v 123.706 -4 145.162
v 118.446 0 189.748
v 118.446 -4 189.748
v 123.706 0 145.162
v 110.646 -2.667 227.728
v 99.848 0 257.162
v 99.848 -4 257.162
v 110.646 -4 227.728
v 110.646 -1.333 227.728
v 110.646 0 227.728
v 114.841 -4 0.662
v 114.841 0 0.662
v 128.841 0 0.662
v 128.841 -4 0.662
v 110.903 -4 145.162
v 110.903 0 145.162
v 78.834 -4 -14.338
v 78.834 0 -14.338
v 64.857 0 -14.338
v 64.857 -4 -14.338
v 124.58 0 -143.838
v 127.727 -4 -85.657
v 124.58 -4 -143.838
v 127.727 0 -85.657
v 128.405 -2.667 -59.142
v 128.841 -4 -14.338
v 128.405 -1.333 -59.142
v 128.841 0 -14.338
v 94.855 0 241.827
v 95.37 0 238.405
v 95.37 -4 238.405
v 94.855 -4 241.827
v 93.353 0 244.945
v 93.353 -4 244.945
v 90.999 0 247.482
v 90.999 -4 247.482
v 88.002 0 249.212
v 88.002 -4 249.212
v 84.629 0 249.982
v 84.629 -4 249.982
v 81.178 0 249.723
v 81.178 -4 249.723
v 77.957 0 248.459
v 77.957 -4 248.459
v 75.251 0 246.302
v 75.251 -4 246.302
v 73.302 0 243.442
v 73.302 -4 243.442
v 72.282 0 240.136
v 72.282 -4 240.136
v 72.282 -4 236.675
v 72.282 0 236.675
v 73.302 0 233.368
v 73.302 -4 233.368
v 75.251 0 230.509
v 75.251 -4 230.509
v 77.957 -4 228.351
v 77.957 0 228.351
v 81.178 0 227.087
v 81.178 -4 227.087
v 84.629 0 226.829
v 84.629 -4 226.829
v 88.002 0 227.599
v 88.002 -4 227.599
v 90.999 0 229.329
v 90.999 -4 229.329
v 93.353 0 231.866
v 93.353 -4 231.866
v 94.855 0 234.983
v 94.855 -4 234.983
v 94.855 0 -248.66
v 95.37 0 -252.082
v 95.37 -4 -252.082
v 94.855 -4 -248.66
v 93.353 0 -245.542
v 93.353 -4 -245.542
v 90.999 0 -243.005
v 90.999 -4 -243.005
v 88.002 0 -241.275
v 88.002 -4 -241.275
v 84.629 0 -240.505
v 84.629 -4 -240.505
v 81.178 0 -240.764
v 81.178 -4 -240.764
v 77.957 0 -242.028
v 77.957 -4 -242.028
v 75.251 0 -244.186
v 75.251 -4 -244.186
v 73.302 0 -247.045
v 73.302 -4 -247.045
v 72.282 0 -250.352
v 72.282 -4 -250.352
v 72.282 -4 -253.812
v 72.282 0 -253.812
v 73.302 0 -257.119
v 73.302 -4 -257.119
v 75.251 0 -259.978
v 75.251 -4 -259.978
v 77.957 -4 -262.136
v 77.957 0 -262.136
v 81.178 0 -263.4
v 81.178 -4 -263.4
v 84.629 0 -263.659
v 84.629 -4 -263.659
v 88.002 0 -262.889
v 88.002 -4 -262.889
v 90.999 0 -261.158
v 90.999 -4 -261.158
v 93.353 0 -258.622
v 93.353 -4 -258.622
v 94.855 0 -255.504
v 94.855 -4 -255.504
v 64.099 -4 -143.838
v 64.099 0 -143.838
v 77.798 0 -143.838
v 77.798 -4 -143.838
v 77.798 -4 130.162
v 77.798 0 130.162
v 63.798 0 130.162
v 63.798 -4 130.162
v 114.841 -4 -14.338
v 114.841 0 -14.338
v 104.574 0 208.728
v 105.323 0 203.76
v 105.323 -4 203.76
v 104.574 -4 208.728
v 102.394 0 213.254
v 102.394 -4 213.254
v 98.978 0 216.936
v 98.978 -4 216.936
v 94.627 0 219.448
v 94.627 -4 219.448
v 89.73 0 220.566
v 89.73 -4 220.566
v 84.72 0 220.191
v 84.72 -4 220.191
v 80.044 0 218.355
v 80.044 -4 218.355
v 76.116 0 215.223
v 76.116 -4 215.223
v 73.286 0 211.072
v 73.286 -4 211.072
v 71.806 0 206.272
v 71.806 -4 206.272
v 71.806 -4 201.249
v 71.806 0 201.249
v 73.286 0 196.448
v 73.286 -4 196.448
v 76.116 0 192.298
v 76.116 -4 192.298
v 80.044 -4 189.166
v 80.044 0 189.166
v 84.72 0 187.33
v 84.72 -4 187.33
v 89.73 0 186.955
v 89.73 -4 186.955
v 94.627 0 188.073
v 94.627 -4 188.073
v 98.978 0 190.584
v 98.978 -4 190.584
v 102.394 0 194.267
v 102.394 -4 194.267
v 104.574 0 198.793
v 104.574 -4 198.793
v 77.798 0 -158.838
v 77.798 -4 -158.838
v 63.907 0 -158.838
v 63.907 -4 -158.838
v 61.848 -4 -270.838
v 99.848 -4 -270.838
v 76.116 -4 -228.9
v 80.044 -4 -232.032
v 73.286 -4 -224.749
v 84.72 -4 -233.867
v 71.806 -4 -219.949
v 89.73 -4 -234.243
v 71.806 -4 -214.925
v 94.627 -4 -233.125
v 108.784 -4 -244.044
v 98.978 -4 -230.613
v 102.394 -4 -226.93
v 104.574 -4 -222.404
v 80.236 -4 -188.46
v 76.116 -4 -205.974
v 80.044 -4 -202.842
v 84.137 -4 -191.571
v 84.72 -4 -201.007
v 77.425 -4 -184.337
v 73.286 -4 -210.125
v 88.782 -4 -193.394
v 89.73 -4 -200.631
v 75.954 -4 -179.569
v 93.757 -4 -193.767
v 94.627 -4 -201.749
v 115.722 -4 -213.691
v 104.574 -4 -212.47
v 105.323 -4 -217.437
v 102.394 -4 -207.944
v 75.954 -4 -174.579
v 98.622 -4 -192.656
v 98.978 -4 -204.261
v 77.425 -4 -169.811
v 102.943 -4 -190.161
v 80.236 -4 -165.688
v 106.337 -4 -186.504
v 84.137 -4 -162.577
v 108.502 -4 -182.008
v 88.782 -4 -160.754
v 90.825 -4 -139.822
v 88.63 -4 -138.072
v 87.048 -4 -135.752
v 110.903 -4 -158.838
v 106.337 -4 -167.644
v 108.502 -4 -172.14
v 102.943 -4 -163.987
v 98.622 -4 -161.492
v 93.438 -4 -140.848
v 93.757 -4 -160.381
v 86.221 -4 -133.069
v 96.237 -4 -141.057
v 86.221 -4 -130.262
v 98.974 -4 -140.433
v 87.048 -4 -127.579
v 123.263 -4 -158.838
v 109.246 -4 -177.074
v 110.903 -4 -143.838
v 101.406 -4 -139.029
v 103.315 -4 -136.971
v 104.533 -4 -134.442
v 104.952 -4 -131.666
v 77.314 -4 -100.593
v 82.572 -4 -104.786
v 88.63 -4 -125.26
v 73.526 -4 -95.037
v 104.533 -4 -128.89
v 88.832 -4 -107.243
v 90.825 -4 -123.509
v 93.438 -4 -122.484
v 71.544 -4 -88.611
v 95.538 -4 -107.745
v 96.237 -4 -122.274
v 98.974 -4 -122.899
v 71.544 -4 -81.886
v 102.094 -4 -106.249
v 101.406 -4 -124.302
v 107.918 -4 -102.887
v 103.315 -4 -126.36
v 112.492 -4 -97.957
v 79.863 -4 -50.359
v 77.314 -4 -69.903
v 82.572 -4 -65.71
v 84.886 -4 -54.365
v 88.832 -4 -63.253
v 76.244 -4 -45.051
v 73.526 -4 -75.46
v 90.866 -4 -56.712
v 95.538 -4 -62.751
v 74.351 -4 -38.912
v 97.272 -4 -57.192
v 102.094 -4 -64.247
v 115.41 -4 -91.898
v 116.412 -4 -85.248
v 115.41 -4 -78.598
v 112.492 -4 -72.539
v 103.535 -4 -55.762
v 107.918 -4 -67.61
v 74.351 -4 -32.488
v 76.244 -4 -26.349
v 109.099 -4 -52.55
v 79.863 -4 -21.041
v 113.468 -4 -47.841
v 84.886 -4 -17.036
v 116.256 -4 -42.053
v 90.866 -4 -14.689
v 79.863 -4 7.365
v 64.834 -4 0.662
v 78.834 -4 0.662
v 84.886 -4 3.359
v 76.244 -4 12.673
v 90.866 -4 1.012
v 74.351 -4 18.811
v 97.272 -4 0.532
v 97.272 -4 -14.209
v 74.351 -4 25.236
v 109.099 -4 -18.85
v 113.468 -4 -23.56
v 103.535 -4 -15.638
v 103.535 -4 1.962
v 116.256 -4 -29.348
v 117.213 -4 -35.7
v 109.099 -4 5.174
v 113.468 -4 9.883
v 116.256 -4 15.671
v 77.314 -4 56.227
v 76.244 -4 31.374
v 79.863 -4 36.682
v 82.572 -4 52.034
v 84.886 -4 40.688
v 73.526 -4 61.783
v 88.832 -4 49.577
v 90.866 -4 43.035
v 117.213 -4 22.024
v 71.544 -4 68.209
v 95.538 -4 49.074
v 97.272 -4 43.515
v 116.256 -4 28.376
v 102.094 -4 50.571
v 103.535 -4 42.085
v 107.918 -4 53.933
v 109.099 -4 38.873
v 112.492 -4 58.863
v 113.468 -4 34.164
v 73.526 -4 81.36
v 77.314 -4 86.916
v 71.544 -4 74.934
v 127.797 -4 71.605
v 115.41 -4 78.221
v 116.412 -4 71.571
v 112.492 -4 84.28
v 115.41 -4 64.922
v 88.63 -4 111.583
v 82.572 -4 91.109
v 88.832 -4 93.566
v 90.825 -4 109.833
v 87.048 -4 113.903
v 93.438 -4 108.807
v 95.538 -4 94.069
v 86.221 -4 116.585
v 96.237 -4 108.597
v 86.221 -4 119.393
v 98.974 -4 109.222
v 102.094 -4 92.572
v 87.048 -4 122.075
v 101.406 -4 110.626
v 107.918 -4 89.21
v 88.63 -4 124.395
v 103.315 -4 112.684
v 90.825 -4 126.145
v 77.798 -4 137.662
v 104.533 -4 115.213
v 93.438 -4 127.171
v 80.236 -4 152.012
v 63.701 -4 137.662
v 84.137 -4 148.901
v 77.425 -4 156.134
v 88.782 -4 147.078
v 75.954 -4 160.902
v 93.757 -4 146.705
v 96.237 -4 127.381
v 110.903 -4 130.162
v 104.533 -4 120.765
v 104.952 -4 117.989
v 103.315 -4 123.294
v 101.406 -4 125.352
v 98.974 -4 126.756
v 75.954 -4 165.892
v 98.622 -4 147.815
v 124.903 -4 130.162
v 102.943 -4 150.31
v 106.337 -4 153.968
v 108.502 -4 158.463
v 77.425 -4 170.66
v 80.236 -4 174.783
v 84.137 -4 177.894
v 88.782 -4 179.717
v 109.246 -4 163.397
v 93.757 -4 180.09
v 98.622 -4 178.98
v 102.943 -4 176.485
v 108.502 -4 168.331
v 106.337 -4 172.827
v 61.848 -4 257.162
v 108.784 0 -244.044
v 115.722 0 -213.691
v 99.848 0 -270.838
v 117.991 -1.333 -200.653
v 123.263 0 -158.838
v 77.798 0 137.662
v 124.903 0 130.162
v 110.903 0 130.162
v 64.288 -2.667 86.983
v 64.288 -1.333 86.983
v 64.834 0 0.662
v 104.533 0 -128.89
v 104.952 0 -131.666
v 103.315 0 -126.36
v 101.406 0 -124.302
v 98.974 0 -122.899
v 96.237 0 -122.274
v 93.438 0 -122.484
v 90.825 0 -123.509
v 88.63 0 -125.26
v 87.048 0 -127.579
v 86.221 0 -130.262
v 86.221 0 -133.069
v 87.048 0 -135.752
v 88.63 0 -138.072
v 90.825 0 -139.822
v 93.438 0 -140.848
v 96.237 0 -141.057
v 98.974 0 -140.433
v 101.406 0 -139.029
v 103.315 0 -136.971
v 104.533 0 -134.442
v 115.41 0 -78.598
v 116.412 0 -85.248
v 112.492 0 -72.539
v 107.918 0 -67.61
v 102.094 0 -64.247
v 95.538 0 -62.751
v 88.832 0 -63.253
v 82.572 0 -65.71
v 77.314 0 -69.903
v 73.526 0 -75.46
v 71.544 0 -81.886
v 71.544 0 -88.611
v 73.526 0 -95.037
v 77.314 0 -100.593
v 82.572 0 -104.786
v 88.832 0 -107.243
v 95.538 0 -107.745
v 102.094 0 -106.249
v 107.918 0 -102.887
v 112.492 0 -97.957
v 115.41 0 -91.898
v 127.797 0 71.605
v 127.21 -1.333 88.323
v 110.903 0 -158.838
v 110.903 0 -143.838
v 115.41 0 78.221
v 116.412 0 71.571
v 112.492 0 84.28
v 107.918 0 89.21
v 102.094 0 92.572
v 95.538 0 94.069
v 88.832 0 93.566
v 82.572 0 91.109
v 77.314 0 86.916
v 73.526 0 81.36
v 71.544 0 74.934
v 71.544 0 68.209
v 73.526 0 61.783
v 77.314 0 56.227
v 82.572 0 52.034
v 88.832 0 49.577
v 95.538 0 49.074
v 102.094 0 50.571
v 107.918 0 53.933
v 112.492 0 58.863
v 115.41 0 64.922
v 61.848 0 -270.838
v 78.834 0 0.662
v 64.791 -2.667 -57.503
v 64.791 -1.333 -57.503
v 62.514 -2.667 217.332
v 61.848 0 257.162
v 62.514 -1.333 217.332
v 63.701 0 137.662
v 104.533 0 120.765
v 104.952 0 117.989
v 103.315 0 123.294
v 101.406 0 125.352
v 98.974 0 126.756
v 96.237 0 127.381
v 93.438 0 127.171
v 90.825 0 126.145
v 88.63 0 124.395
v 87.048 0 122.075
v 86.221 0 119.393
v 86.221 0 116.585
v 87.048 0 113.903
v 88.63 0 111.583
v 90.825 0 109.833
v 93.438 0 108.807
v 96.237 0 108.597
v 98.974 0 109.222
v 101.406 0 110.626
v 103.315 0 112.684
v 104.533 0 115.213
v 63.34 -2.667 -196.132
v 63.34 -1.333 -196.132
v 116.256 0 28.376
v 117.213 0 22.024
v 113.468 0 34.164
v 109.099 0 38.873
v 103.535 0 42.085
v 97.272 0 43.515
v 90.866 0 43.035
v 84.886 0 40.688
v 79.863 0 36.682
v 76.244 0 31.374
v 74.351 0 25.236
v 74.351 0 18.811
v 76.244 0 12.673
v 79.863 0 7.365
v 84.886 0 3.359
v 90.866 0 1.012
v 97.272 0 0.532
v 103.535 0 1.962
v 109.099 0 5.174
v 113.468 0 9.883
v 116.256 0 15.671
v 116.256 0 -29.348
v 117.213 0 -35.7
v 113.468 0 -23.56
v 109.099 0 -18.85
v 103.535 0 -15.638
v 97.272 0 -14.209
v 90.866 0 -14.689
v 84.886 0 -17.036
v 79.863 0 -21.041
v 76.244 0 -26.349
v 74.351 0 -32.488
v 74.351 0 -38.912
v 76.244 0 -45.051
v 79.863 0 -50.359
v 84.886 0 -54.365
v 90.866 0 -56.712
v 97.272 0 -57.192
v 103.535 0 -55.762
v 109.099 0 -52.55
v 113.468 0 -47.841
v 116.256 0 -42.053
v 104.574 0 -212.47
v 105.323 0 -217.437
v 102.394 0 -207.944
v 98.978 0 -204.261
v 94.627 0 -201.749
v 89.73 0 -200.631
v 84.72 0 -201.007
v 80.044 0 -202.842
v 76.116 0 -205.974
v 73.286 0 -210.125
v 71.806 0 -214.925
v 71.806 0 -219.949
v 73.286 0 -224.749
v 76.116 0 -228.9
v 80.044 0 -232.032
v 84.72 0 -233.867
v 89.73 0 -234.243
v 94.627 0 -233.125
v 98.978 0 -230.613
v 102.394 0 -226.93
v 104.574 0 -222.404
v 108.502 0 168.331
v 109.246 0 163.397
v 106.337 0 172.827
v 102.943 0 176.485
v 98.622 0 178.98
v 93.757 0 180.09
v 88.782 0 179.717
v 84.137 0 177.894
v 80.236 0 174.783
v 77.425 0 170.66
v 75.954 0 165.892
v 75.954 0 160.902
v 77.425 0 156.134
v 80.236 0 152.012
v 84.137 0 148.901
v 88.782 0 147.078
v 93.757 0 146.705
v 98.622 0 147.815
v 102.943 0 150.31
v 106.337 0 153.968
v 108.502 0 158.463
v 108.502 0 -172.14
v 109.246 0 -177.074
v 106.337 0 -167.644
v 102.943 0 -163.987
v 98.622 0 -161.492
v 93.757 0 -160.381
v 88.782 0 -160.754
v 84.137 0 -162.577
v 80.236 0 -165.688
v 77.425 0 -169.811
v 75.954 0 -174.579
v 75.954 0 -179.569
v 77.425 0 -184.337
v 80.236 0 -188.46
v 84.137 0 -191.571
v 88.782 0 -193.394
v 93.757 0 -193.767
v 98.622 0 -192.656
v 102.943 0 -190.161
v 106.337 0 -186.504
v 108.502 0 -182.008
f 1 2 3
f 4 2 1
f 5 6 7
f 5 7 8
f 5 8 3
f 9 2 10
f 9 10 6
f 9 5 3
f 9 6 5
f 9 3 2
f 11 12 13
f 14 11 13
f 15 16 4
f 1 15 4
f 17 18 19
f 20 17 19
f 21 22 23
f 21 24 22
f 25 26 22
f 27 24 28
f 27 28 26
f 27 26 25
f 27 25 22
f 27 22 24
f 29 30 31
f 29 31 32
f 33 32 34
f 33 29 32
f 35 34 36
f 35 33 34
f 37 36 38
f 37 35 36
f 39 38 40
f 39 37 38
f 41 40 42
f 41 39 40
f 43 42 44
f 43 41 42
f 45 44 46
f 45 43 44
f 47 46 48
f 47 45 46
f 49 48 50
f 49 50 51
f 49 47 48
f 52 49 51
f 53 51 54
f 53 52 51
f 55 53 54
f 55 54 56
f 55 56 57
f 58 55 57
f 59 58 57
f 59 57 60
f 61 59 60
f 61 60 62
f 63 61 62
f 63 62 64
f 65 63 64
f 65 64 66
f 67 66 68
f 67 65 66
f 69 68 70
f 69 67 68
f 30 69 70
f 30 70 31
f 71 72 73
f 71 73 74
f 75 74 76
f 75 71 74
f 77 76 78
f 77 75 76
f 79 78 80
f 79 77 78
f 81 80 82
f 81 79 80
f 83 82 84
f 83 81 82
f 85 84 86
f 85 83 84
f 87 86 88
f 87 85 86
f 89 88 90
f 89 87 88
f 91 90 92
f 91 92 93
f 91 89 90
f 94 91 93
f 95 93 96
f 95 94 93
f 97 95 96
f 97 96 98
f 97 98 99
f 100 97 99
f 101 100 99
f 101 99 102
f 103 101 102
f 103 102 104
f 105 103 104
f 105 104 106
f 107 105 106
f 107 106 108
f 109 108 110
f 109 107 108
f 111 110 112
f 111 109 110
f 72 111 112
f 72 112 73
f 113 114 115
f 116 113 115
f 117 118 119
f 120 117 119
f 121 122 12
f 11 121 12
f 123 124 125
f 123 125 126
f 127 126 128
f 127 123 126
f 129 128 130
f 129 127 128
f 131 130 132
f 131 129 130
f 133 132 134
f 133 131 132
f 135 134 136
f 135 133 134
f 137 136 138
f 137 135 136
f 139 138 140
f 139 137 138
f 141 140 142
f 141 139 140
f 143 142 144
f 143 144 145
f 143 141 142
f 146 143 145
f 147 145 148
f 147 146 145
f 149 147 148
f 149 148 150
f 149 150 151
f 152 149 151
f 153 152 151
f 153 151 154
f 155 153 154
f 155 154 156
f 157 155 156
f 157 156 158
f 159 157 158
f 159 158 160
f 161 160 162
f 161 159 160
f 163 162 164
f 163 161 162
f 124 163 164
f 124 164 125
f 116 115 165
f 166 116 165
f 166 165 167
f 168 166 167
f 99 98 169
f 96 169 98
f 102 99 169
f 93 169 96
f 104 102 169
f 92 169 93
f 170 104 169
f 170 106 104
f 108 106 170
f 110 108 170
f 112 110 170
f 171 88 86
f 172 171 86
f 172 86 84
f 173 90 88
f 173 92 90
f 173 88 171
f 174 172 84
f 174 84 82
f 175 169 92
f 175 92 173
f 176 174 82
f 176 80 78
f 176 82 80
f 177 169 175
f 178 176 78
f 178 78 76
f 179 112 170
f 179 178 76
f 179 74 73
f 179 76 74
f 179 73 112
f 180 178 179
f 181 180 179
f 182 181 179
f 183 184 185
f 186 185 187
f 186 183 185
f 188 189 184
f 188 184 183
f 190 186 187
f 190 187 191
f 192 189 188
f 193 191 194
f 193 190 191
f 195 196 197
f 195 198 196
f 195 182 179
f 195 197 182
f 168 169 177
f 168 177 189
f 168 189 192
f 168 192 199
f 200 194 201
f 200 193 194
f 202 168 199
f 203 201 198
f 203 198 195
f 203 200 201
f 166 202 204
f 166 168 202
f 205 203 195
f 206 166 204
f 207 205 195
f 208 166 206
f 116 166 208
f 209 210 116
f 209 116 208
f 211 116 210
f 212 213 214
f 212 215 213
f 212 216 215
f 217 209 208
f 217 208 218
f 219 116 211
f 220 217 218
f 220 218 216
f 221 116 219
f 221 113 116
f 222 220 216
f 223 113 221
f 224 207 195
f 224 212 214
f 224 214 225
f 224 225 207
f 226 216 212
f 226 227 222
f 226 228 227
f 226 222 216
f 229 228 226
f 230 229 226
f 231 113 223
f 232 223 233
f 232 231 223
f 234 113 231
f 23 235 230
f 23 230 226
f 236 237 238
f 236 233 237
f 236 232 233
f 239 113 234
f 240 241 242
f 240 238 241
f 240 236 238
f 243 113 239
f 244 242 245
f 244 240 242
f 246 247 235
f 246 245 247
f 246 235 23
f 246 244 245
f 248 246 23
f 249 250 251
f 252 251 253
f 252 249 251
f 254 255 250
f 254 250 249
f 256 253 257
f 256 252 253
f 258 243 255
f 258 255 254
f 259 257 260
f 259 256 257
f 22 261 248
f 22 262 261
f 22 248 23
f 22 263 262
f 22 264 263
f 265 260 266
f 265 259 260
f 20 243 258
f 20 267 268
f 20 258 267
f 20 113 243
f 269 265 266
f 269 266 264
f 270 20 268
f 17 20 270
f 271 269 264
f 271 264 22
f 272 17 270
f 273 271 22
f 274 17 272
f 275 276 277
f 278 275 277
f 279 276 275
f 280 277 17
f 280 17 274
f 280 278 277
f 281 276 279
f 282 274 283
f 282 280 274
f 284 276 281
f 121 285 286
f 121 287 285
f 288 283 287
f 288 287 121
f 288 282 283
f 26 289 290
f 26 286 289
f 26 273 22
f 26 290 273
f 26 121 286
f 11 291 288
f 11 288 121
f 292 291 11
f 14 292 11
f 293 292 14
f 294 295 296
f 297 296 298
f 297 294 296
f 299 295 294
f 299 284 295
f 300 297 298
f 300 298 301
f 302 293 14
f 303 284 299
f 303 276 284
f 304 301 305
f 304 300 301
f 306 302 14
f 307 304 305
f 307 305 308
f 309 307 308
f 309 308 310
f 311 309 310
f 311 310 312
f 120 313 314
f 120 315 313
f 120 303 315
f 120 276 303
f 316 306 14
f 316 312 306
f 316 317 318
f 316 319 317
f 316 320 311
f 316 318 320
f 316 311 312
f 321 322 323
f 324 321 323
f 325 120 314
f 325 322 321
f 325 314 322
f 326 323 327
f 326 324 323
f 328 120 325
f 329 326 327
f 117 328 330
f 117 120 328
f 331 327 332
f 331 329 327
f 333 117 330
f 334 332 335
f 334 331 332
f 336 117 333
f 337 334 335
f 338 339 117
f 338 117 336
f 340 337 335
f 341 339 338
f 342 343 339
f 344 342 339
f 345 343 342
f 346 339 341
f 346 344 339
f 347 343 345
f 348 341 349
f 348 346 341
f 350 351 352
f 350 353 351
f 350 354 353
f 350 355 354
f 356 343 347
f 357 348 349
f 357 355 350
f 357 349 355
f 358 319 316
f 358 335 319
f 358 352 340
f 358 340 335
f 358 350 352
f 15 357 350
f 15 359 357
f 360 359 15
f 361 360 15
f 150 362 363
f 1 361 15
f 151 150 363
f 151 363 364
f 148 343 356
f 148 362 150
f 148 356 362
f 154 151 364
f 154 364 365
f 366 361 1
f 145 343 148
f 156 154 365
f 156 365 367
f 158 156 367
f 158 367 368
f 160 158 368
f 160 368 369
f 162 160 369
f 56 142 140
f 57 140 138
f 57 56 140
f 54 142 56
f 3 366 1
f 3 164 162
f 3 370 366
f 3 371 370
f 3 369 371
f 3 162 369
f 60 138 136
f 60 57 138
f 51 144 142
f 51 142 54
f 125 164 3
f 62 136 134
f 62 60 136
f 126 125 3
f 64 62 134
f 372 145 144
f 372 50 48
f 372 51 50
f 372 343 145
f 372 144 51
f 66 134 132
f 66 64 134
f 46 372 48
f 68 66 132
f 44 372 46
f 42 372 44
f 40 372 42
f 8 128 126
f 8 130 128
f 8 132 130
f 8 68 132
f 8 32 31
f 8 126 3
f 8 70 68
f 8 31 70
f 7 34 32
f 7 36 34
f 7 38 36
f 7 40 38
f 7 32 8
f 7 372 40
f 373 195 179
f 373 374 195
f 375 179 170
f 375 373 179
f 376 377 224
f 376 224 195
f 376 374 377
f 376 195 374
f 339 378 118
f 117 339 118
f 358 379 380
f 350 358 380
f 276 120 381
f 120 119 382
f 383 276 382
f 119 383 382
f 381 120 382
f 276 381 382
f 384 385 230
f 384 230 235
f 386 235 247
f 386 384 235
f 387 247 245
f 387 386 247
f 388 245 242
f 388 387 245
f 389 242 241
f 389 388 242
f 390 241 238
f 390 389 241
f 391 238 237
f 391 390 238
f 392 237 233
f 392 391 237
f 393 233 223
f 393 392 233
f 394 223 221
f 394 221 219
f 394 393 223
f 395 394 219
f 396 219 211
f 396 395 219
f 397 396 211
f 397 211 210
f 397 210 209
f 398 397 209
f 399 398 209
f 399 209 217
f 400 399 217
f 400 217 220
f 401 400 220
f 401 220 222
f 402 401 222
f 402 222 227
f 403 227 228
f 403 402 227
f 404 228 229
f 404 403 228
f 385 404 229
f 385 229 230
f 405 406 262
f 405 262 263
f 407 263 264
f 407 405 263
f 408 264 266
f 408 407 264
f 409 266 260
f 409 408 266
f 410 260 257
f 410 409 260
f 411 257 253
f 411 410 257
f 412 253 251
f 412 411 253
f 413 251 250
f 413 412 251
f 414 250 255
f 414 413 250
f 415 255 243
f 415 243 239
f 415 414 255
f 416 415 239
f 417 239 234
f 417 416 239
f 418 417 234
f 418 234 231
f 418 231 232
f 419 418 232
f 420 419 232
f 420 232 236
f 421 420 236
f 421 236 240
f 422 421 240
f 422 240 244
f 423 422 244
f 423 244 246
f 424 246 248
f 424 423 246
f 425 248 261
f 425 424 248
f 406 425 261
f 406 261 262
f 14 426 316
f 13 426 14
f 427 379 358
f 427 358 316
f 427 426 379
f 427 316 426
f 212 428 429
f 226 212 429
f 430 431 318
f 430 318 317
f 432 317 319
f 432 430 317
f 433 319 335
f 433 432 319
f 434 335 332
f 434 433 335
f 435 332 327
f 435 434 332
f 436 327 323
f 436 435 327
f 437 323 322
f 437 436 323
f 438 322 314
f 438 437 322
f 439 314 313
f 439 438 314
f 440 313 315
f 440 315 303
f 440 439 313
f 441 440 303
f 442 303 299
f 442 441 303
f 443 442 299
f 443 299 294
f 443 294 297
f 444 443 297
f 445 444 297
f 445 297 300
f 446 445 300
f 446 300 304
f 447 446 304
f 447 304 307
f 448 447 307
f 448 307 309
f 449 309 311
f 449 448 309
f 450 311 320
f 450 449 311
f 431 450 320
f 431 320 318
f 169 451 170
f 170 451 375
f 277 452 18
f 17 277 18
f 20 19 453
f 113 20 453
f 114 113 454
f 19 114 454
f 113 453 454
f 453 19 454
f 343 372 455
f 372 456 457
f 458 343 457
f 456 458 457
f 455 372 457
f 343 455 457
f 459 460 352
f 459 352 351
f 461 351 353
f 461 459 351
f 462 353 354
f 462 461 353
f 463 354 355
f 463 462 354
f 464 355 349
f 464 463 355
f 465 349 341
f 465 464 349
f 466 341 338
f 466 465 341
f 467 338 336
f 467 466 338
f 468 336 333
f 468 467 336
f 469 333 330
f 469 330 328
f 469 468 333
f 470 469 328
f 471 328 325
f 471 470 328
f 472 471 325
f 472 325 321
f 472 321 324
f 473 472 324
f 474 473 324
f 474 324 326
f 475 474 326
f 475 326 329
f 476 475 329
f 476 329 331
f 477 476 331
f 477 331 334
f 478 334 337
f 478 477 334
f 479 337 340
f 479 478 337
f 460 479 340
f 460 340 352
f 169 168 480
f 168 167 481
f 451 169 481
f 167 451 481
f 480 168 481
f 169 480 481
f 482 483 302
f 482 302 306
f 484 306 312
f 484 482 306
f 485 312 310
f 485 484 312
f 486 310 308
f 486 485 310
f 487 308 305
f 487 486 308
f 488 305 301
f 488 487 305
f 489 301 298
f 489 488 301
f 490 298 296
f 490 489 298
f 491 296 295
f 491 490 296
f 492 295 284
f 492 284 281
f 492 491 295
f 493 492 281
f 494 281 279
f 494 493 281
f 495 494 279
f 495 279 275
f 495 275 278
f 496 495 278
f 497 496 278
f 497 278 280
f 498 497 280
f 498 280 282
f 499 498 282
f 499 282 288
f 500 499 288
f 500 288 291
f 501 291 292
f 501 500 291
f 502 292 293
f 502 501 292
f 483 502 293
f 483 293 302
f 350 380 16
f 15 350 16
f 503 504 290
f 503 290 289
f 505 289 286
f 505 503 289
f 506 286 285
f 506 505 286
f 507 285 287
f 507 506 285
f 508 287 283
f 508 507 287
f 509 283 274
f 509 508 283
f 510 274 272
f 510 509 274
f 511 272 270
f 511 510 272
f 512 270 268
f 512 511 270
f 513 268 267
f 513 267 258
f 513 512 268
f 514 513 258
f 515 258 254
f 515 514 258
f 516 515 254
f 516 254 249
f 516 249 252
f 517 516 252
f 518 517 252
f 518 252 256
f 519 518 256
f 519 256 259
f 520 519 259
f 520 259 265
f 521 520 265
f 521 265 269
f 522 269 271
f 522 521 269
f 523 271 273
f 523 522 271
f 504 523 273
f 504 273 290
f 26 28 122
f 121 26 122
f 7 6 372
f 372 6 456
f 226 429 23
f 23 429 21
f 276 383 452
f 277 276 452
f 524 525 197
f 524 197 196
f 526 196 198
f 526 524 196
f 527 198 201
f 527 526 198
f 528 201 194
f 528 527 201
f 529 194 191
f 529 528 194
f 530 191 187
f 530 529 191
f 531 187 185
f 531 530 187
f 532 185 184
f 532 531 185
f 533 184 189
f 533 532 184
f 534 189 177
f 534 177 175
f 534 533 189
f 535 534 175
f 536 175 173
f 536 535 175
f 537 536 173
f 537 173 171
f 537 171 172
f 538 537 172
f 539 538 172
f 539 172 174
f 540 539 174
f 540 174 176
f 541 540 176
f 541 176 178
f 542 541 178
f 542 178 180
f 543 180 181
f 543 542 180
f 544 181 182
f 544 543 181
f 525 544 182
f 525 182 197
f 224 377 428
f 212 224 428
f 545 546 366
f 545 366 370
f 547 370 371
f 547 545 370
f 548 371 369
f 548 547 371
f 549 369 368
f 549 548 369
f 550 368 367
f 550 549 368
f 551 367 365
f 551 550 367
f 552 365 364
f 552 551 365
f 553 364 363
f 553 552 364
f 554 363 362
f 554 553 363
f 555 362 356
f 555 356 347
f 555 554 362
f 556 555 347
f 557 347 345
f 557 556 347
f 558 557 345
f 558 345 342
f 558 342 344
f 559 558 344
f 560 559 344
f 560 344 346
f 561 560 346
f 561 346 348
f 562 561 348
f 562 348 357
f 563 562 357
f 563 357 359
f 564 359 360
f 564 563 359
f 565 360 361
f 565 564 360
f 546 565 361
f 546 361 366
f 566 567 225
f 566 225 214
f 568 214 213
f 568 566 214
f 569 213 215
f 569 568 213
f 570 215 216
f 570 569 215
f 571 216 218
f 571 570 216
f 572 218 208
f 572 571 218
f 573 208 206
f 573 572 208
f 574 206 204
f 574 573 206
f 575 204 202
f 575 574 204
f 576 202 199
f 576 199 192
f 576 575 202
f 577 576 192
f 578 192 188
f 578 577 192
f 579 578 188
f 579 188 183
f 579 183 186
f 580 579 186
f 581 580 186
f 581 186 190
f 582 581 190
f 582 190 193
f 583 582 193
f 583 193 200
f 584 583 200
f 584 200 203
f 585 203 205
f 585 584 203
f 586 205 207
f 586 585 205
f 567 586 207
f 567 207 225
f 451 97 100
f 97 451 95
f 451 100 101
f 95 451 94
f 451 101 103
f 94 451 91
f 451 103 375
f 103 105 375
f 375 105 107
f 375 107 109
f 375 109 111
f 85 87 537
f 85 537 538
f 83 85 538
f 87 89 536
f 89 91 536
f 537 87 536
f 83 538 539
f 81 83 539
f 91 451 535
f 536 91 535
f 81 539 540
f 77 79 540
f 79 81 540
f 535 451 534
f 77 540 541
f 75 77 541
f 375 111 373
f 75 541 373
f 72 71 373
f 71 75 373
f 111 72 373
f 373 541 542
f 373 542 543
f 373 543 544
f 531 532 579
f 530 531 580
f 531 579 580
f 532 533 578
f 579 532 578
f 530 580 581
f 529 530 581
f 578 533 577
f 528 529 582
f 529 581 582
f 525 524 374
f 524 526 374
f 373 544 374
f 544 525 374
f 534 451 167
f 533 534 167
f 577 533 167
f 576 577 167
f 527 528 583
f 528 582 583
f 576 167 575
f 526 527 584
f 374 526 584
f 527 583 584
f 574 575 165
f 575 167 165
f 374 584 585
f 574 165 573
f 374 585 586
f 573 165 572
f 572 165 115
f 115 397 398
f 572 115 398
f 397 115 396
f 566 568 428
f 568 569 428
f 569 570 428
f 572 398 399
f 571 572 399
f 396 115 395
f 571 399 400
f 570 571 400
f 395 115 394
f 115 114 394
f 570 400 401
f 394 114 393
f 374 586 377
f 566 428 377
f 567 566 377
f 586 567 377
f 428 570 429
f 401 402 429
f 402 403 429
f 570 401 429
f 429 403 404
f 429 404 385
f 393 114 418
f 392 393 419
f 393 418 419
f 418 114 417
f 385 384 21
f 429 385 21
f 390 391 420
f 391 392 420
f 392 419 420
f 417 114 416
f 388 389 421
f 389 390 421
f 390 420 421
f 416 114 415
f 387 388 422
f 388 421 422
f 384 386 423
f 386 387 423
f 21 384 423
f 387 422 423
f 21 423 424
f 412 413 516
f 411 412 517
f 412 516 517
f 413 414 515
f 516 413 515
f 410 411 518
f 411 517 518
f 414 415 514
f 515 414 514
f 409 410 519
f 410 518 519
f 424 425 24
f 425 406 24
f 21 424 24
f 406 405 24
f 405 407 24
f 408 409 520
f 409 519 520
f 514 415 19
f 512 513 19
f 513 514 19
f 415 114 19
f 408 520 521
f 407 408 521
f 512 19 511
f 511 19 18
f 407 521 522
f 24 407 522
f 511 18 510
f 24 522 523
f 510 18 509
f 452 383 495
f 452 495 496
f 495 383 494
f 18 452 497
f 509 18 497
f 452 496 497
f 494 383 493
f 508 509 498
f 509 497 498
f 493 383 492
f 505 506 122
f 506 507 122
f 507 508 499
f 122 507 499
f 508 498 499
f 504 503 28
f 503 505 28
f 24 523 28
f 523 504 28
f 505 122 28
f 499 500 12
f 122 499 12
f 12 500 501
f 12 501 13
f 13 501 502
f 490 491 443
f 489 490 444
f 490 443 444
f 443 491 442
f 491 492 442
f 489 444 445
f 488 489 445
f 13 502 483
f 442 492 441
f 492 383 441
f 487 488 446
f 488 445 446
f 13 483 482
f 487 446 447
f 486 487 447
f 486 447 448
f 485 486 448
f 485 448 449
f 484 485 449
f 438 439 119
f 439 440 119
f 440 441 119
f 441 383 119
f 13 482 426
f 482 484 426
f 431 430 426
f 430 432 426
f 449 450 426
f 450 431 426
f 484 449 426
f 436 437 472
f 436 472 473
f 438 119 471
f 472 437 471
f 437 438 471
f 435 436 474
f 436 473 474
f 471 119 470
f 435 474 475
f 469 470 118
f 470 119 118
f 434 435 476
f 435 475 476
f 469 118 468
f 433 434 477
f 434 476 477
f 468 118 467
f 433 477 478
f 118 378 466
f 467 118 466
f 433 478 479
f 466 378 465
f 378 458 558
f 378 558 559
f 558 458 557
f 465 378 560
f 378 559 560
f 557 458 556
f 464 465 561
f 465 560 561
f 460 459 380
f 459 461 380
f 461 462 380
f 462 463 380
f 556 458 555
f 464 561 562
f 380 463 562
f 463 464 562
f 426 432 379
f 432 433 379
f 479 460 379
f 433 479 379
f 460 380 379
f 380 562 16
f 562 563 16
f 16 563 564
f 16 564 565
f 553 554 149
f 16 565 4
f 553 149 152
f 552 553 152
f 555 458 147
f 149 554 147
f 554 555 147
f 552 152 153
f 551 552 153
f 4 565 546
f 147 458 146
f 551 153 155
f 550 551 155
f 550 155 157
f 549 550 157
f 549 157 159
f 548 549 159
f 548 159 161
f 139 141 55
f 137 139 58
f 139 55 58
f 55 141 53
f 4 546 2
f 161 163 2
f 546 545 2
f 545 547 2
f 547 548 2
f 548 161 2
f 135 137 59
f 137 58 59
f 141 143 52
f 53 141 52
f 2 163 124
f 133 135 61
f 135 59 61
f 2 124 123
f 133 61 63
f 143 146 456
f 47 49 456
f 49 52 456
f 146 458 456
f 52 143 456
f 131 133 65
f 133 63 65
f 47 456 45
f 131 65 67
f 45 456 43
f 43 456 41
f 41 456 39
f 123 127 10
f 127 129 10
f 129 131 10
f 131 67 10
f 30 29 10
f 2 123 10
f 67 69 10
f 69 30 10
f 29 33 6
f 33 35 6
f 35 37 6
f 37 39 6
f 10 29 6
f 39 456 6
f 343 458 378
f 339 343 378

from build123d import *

# Parameters (mm, degrees)
F0_R     = 22.5603447523
F0_R_2   = 21.5516802716
F0_R_3   = 9.418040514
F0_R_4   = 16.7395174503
F0_R_5   = 11.6092445083
F0_R_6   = 16.8526987349
F1_DEPTH = 4


# Not quite as in the source:
# - ends of sketch curves that miss each other by under 0.0002 mm in the source are joined


with BuildPart() as f1:
    # F0 (on Front) → F1 (new body)
    with BuildSketch(Plane.XZ):
        with BuildLine():
            Line((78.8341670899, -6.8383235484), (114.8409428481, -6.8383235484))
            Line((114.8409428481, -6.8383235484), (114.8409428481, 0.6616764516))
            Line((114.8409428481, 0.6616764516), (128.8409428481, 0.6616764516))
            add(Edge.make_bspline(
                [(124.9033857451, 130.1616764516), (127.8407562373, 89.5517987134), (128.7514642032, 44.6895821219), (128.8409428481, 0.6616764516)],
                knots=[0.2778483476, 0.2778483476, 0.2778483476, 0.2778483476, 0.4880499366, 0.4880499366, 0.4880499366, 0.4880499366], degree=3))
            Line((124.9033857451, 130.1616764516), (110.9033857451, 130.1616764516))
            Line((110.9033857451, 130.1616764516), (110.9033857451, 137.6616764516))
            Line((110.9033857451, 137.6616764516), (77.7980855424, 137.6616764516))
            Line((77.7980855424, 137.6616764516), (77.7980855424, 130.1616764516))
            Line((77.7980855424, 130.1616764516), (63.7980855424, 130.1616764516))
            add(Edge.make_bspline(
                [(63.7980855424, 130.1616764516), (64.3462926476, 86.9798084925), (64.7350115683, 43.8051528282), (64.8341670899, 0.6616764516)],
                knots=[0.2404841481, 0.2404841481, 0.2404841481, 0.2404841481, 0.4857851385, 0.4857851385, 0.4857851385, 0.4857851385], degree=3))
            Line((64.8341670899, 0.6616764516), (78.8341670899, 0.6616764516))
            Line((78.8341670899, 0.6616764516), (78.8341670899, -6.8383235484))
        make_face()
        with Locations((93.8518792391, 71.5714693069)):
            Circle(F0_R, mode=Mode.SUBTRACT)
        with Locations((95.6616252661, 22.0235623419)):
            Circle(F0_R_2, mode=Mode.SUBTRACT)
        with Locations((95.5336689949, 117.9889589548)):
            Circle(F0_R_3, mode=Mode.SUBTRACT)
        with BuildLine():
            Line((110.9033857451, 145.1616764516), (123.7062231815, 145.1616764516))
            add(Edge.make_bspline(
                [(99.8484624624, 257.1616764516), (112.2986005896, 232.646487185), (119.5620823416, 192.4052892247), (123.7062231815, 145.1616764516)],
                knots=[0, 0, 0, 0, 0.2516076621, 0.2516076621, 0.2516076621, 0.2516076621], degree=3))
            Line((99.8484624624, 257.1616764516), (61.8484624624, 257.1616764516))
            add(Edge.make_bspline(
                [(61.8484624624, 257.1616764516), (62.5273104324, 217.3359288807), (63.1789559316, 177.4963243829), (63.701293151, 137.6616764516)],
                knots=[0, 0, 0, 0, 0.2262826567, 0.2262826567, 0.2262826567, 0.2262826567], degree=3))
            Line((63.701293151, 137.6616764516), (77.7980855424, 137.6616764516))
            Line((77.7980855424, 137.6616764516), (110.9033857451, 137.6616764516))
            Line((110.9033857451, 137.6616764516), (110.9033857451, 145.1616764516))
        make_face()
        with Locations((92.5064459443, 163.3973568678)):
            Circle(F0_R_4, mode=Mode.SUBTRACT)
        with Locations((83.761125803, 238.4053170681)):
            Circle(F0_R_5, mode=Mode.SUBTRACT)
        with Locations((88.47014606, 203.7603855133)):
            Circle(F0_R_6, mode=Mode.SUBTRACT)
        with BuildLine():
            Line((114.8409428481, -14.3383235484), (114.8409428481, -6.8383235484))
            Line((114.8409428481, -6.8383235484), (78.8341670899, -6.8383235484))
            Line((78.8341670899, -6.8383235484), (78.8341670899, -14.3383235484))
            Line((78.8341670899, -14.3383235484), (64.8568045286, -14.3383235484))
            add(Edge.make_bspline(
                [(64.8568045286, -14.3383235484), (64.8876732357, -57.5094122228), (64.6230490688, -100.6520537776), (64.0989954927, -143.8383235484)],
                knots=[0.51421607, 0.51421607, 0.51421607, 0.51421607, 0.7597151822, 0.7597151822, 0.7597151822, 0.7597151822], degree=3))
            Line((64.0989954927, -143.8383235484), (77.7980855424, -143.8383235484))
            Line((77.7980855424, -143.8383235484), (77.7980855424, -151.3383235484))
            Line((77.7980855424, -151.3383235484), (77.7980855424, -158.8383235484))
            Line((77.7980855424, -158.8383235484), (63.9066232608, -158.8383235484))
            add(Edge.make_bspline(
                [(63.9066232608, -158.8383235484), (63.4029478239, -196.117508426), (62.7091678723, -233.4354001086), (61.8484624624, -270.8383235484)],
                knots=[0.7881349295, 0.7881349295, 0.7881349295, 0.7881349295, 1, 1, 1, 1], degree=3))
            Line((61.8484624624, -270.8383235484), (99.8484624624, -270.8383235484))
            add(Edge.make_bspline(
                [(123.2627847104, -158.8383235484), (119.0509791243, -202.5082607649), (111.8659348538, -240.9997580131), (99.8484624624, -270.8383235484)],
                knots=[0.7571361778, 0.7571361778, 0.7571361778, 0.7571361778, 1, 1, 1, 1], degree=3))
            Line((123.2627847104, -158.8383235484), (110.9033857451, -158.8383235484))
            Line((110.9033857451, -158.8383235484), (110.9033857451, -151.3383235484))
            Line((110.9033857451, -151.3383235484), (110.9033857451, -143.8383235484))
            Line((110.9033857451, -143.8383235484), (124.5795751588, -143.8383235484))
            add(Edge.make_bspline(
                [(128.8408993214, -14.3383234592), (128.7479516437, -59.6820922187), (127.7738982193, -103.6829779906), (124.5795751588, -143.8383235484)],
                knots=[0.5119840968, 0.5119840968, 0.5119840968, 0.5119840968, 0.7296879862, 0.7296879862, 0.7296879862, 0.7296879862], degree=3))
            Line((128.8408993214, -14.3383234592), (114.8409428481, -14.3383235484))
        make_face()
        with Locations((83.761125803, -252.081964165)):
            Circle(F0_R_5, mode=Mode.SUBTRACT)
        with Locations((88.47014606, -217.4370326102)):
            Circle(F0_R_6, mode=Mode.SUBTRACT)
        with Locations((92.5064459443, -177.0740039647)):
            Circle(F0_R_4, mode=Mode.SUBTRACT)
        with Locations((93.8518792391, -85.2481164038)):
            Circle(F0_R, mode=Mode.SUBTRACT)
        with Locations((95.5336689949, -131.6656060517)):
            Circle(F0_R_3, mode=Mode.SUBTRACT)
        with Locations((95.6616252661, -35.7002094388)):
            Circle(F0_R_2, mode=Mode.SUBTRACT)
    extrude(amount=F1_DEPTH)


solid = f1.part
